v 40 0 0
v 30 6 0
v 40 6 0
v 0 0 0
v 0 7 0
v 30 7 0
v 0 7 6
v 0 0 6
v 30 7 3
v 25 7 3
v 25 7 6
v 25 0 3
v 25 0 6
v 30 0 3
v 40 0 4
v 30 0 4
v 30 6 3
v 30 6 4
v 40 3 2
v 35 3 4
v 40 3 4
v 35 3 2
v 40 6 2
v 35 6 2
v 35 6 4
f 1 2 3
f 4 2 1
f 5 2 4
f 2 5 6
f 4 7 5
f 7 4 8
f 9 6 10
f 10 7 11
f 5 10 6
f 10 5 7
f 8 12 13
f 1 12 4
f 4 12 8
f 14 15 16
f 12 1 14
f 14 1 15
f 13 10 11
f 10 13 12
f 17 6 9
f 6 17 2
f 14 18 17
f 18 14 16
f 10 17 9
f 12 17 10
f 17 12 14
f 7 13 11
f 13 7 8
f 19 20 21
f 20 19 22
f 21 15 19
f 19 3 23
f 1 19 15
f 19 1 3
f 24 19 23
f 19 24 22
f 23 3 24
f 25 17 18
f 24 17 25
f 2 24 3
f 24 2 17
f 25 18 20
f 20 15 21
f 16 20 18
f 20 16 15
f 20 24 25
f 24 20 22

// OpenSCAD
translate([2.5, 3.5, 1.5]) color([0.14692685712634312, 0.1252359956830017, 0.2228174233130471]) cube([5, 7, 3], center=true);
translate([7.5, 3.5, 1.5]) color([0.5083324480268261, 0.23665719296677712, 0.18394442119493715]) cube([5, 7, 3], center=true);
translate([12.5, 3.5, 1.5]) color([0.3724619255943996, 0.6631955135334705, 0.8609746033864751]) cube([5, 7, 3], center=true);
translate([17.5, 3.5, 1.5]) color([0.6012082175951422, 0.3938011681878649, 0.7021695231885549]) cube([5, 7, 3], center=true);
translate([22.5, 3.5, 1.5]) color([0.13202027544551864, 0.29938666187805807, 0.4167493264442593]) cube([5, 7, 3], center=true);
translate([27.5, 3.5, 1.5]) color([0.9263964007964989, 0.5910765187605377, 0.2980281087530109]) cube([5, 7, 3], center=true);
translate([2.5, 3.5, 4.5]) color([0.35456411603507165, 0.24805850121983253, 0.6327789974902275]) cube([5, 7, 3], center=true);
translate([7.5, 3.5, 4.5]) color([0.6370445113549524, 0.5292072971005523, 0.376431751315491]) cube([5, 7, 3], center=true);
translate([12.5, 3.5, 4.5]) color([0.008427608141492793, 0.9619565585865117, 0.901262330417864]) cube([5, 7, 3], center=true);
translate([17.5, 3.5, 4.5]) color([0.44129738363616366, 0.3715965769686672, 0.9523409342086877]) cube([5, 7, 3], center=true);
translate([22.5, 3.5, 4.5]) color([0.09105648808381206, 0.18545820412424963, 0.10861526636012075]) cube([5, 7, 3], center=true);
translate([32.5, 1.5, 1.0]) color([0.11215874223546374, 0.6055458611860893, 0.15387883630139487]) cube([5, 3, 2], center=true);
translate([37.5, 1.5, 1.0]) color([0.7025980908137885, 0.928268212070889, 0.18538068806857422]) cube([5, 3, 2], center=true);
translate([32.5, 4.5, 1.0]) color([0.42170431041506296, 0.1747372019883816, 0.9595322940755414]) cube([5, 3, 2], center=true);
translate([37.5, 4.5, 1.0]) color([0.3403879026852894, 0.5233486454380116, 0.35536744790103547]) cube([5, 3, 2], center=true);
translate([32.5, 1.5, 3.0]) color([0.6315169232882821, 0.08649939658707362, 0.7550350740823142]) cube([5, 3, 2], center=true);
translate([37.5, 1.5, 3.0]) color([0.2947283238309857, 0.8301737658604361, 0.4490883769000732]) cube([5, 3, 2], center=true);
translate([32.5, 4.5, 3.0]) color([0.4620108455998946, 0.2187341846418389, 0.11445722556586746]) cube([5, 3, 2], center=true);
